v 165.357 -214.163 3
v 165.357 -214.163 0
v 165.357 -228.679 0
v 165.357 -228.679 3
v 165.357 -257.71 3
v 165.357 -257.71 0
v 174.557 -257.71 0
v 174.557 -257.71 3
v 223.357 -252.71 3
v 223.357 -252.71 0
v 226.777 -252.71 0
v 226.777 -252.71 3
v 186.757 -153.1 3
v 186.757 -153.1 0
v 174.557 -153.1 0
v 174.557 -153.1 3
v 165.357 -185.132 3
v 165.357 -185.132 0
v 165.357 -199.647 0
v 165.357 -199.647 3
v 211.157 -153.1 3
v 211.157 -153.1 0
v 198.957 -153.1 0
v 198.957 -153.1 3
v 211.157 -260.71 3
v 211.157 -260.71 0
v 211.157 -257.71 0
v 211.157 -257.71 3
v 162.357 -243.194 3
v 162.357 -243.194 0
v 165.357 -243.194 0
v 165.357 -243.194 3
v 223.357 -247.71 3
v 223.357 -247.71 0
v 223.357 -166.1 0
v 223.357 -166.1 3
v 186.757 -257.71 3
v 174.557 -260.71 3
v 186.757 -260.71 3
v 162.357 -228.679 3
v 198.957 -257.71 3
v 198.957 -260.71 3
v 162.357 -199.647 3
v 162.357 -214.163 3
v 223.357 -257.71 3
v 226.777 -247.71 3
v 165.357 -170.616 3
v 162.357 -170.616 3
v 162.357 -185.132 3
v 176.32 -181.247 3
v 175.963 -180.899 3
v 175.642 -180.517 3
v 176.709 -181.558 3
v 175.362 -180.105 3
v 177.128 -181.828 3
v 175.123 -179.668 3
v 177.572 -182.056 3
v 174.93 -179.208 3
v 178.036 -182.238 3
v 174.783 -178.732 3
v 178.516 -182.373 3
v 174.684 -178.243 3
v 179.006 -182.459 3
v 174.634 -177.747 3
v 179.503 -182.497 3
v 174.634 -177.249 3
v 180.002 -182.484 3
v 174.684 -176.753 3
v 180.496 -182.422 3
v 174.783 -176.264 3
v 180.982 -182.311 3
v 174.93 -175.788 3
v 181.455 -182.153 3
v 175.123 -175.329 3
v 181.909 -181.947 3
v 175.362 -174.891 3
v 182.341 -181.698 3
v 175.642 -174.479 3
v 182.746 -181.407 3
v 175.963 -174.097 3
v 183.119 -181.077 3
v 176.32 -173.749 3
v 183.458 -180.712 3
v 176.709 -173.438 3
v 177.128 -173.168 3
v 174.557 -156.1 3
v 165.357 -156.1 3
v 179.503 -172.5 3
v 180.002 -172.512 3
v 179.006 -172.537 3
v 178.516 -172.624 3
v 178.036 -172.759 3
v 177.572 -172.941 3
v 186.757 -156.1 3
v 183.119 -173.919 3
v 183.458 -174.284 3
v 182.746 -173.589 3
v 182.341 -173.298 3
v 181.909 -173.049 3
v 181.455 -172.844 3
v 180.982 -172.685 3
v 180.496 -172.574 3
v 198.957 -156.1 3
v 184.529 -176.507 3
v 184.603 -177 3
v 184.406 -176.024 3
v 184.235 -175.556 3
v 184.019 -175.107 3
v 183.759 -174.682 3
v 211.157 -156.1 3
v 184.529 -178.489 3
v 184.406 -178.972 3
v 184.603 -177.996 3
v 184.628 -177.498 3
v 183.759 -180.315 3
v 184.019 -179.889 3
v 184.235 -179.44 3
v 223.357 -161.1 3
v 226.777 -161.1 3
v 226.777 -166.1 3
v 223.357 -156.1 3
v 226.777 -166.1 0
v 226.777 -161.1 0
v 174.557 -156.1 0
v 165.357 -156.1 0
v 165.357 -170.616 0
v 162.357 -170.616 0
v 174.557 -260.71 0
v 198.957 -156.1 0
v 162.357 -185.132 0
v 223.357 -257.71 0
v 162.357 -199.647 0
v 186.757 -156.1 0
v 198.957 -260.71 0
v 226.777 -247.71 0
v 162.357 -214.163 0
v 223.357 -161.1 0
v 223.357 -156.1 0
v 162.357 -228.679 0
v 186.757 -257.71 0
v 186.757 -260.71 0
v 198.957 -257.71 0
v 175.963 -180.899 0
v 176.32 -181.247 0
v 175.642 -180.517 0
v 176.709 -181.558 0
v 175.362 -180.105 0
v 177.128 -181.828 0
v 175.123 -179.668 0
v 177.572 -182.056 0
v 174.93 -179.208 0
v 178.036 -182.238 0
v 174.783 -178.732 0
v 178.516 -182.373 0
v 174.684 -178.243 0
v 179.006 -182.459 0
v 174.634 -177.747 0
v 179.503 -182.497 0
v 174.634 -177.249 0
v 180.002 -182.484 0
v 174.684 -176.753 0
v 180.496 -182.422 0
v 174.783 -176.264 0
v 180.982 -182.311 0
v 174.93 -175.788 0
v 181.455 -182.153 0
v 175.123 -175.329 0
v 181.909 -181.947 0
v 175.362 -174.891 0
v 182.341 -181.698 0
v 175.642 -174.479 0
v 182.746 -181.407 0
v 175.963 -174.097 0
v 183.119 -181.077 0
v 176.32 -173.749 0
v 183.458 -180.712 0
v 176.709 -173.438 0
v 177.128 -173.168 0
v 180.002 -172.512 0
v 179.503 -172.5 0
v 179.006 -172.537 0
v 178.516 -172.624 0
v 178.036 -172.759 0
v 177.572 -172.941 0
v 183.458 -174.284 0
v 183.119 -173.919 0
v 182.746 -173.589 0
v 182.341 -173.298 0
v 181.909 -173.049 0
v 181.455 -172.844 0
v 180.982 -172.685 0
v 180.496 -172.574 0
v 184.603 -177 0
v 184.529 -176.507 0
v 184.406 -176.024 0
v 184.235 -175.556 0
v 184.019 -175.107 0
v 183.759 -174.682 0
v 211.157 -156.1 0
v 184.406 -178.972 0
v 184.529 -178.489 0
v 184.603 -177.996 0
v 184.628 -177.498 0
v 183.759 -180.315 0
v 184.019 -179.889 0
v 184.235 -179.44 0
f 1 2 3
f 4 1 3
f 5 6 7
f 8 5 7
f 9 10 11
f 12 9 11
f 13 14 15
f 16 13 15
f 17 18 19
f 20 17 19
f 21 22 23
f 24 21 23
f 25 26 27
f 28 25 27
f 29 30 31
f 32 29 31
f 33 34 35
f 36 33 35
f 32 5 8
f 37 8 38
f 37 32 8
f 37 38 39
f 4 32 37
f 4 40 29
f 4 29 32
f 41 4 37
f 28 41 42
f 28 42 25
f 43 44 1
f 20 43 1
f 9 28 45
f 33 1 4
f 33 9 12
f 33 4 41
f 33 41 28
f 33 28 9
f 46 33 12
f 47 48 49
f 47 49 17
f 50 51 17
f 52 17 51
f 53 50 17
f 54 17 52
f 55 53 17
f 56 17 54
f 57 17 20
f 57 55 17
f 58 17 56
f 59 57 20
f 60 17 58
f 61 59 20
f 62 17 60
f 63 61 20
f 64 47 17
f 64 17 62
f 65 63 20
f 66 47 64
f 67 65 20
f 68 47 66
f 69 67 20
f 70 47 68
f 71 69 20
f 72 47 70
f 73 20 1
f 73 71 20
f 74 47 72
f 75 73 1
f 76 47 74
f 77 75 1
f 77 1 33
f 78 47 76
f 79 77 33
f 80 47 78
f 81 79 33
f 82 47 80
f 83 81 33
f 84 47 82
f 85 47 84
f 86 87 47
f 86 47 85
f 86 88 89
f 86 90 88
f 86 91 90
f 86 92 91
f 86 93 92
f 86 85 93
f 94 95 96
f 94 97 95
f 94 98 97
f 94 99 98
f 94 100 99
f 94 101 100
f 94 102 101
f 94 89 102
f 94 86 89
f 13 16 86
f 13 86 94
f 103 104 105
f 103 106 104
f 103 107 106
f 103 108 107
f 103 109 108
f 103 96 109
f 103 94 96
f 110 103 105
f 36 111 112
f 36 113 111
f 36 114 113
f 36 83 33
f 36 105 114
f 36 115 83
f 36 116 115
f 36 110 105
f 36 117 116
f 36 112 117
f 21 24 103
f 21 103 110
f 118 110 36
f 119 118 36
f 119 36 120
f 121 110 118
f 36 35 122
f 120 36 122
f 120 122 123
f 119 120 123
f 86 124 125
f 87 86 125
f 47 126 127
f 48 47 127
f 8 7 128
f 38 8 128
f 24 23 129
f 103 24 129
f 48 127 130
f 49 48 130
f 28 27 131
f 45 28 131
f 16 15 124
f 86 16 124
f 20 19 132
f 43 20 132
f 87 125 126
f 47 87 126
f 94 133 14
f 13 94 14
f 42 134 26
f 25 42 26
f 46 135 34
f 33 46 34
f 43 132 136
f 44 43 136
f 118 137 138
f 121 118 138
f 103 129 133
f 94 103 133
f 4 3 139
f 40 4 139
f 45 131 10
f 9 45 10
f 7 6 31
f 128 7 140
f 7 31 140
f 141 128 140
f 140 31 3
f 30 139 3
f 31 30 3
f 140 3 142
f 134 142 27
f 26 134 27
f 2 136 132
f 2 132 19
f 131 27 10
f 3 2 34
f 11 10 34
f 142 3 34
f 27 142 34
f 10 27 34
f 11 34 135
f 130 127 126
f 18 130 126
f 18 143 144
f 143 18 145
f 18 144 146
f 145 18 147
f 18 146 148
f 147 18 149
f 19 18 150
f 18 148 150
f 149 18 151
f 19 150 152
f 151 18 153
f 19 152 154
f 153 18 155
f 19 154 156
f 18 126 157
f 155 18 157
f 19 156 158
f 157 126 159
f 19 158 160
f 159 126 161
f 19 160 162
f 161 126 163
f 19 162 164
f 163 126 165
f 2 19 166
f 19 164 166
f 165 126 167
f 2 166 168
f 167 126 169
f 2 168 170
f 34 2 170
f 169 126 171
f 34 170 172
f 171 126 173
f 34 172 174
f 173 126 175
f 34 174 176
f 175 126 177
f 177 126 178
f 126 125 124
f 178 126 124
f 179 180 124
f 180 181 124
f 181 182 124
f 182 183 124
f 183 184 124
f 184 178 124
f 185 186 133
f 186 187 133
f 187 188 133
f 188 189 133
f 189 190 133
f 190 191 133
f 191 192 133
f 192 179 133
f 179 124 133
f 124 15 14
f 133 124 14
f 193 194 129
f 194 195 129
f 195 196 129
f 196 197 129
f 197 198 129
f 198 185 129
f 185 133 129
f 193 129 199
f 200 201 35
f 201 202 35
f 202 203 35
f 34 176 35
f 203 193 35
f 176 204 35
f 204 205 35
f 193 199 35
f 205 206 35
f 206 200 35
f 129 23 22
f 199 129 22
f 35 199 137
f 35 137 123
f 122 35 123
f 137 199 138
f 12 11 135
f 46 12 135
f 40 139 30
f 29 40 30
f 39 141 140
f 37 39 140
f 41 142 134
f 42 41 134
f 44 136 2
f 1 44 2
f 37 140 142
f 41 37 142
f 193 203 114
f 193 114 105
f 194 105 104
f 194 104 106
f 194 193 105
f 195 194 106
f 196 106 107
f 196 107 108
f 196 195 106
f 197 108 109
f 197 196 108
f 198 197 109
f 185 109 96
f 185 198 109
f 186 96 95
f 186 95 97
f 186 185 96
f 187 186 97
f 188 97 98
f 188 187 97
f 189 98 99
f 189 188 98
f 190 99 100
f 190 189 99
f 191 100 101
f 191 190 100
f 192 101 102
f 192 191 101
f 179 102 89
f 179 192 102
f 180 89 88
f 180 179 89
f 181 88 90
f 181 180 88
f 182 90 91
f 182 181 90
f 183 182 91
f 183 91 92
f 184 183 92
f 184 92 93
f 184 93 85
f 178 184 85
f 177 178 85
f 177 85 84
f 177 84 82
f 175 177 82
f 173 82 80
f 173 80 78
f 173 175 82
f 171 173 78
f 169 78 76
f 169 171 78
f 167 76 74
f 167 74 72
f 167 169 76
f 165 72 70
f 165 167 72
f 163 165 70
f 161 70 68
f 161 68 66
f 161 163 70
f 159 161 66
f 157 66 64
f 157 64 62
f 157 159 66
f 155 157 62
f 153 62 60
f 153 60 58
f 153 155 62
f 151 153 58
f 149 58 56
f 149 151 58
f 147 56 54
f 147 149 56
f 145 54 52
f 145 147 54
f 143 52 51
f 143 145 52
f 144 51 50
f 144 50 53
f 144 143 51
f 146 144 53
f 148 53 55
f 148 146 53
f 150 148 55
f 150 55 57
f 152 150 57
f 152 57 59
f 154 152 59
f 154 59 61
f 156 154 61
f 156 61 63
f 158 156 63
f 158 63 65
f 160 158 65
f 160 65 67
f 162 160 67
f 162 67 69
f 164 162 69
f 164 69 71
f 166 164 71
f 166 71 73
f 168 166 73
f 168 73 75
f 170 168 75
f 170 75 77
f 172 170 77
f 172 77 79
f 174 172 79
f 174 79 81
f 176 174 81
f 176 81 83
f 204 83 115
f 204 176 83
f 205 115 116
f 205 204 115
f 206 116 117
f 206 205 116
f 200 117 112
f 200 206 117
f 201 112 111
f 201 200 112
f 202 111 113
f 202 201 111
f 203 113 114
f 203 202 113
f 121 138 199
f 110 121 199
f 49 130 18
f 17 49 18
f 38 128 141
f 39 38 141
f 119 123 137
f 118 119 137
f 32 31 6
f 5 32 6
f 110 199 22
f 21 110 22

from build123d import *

# Parameters (mm, degrees)
CROQUIS1_R              = 5
SALIENTE_EXTRUIR1_DEPTH = 3


with BuildPart() as part:
    # Croquis1 → Saliente-Extruir1 (new body)
    with BuildSketch(Plane.XY):
        Polygon((174.557067775, -156.100114598), (165.357067775, -156.100114598), (165.357067775, -170.615828883), (162.357067775, -170.615828883), (162.357067775, -185.131543169), (165.357067775, -185.131543169), (165.357067775, -199.647257455), (162.357067775, -199.647257455), (162.357067775, -214.162971741), (165.357067775, -214.162971741), (165.357067775, -228.678686026), (162.357067775, -228.678686026), (162.357067775, -243.194400312), (165.357067775, -243.194400312), (165.357067775, -257.710114598), (174.557067775, -257.710114598), (174.557067775, -260.710114598), (186.757067775, -260.710114598), (186.757067775, -257.710114598), (198.957067775, -257.710114598), (198.957067775, -260.710114598), (211.157067775, -260.710114598), (211.157067775, -257.710114598), (223.357067775, -257.710114598), (223.357067775, -252.710114598), (226.776809623, -252.710114598), (226.776809623, -247.710114598), (223.357067775, -247.710114598), (223.357067775, -170.615828883), (223.357067775, -166.100114598), (226.776809623, -166.100114598), (226.776809623, -161.100114598), (223.357067775, -161.100114598), (223.357067775, -156.100114598), (211.157067775, -156.100114598), (211.157067775, -153.100114598), (198.957067775, -153.100114598), (198.957067775, -156.100114598), (186.757067775, -156.100114598), (186.757067775, -153.100114598), (174.557067775, -153.100114598), align=None)
        with Locations((179.628110515, -177.498140377)):
            Circle(CROQUIS1_R, mode=Mode.SUBTRACT)
    extrude(amount=SALIENTE_EXTRUIR1_DEPTH)


solid = part.part
